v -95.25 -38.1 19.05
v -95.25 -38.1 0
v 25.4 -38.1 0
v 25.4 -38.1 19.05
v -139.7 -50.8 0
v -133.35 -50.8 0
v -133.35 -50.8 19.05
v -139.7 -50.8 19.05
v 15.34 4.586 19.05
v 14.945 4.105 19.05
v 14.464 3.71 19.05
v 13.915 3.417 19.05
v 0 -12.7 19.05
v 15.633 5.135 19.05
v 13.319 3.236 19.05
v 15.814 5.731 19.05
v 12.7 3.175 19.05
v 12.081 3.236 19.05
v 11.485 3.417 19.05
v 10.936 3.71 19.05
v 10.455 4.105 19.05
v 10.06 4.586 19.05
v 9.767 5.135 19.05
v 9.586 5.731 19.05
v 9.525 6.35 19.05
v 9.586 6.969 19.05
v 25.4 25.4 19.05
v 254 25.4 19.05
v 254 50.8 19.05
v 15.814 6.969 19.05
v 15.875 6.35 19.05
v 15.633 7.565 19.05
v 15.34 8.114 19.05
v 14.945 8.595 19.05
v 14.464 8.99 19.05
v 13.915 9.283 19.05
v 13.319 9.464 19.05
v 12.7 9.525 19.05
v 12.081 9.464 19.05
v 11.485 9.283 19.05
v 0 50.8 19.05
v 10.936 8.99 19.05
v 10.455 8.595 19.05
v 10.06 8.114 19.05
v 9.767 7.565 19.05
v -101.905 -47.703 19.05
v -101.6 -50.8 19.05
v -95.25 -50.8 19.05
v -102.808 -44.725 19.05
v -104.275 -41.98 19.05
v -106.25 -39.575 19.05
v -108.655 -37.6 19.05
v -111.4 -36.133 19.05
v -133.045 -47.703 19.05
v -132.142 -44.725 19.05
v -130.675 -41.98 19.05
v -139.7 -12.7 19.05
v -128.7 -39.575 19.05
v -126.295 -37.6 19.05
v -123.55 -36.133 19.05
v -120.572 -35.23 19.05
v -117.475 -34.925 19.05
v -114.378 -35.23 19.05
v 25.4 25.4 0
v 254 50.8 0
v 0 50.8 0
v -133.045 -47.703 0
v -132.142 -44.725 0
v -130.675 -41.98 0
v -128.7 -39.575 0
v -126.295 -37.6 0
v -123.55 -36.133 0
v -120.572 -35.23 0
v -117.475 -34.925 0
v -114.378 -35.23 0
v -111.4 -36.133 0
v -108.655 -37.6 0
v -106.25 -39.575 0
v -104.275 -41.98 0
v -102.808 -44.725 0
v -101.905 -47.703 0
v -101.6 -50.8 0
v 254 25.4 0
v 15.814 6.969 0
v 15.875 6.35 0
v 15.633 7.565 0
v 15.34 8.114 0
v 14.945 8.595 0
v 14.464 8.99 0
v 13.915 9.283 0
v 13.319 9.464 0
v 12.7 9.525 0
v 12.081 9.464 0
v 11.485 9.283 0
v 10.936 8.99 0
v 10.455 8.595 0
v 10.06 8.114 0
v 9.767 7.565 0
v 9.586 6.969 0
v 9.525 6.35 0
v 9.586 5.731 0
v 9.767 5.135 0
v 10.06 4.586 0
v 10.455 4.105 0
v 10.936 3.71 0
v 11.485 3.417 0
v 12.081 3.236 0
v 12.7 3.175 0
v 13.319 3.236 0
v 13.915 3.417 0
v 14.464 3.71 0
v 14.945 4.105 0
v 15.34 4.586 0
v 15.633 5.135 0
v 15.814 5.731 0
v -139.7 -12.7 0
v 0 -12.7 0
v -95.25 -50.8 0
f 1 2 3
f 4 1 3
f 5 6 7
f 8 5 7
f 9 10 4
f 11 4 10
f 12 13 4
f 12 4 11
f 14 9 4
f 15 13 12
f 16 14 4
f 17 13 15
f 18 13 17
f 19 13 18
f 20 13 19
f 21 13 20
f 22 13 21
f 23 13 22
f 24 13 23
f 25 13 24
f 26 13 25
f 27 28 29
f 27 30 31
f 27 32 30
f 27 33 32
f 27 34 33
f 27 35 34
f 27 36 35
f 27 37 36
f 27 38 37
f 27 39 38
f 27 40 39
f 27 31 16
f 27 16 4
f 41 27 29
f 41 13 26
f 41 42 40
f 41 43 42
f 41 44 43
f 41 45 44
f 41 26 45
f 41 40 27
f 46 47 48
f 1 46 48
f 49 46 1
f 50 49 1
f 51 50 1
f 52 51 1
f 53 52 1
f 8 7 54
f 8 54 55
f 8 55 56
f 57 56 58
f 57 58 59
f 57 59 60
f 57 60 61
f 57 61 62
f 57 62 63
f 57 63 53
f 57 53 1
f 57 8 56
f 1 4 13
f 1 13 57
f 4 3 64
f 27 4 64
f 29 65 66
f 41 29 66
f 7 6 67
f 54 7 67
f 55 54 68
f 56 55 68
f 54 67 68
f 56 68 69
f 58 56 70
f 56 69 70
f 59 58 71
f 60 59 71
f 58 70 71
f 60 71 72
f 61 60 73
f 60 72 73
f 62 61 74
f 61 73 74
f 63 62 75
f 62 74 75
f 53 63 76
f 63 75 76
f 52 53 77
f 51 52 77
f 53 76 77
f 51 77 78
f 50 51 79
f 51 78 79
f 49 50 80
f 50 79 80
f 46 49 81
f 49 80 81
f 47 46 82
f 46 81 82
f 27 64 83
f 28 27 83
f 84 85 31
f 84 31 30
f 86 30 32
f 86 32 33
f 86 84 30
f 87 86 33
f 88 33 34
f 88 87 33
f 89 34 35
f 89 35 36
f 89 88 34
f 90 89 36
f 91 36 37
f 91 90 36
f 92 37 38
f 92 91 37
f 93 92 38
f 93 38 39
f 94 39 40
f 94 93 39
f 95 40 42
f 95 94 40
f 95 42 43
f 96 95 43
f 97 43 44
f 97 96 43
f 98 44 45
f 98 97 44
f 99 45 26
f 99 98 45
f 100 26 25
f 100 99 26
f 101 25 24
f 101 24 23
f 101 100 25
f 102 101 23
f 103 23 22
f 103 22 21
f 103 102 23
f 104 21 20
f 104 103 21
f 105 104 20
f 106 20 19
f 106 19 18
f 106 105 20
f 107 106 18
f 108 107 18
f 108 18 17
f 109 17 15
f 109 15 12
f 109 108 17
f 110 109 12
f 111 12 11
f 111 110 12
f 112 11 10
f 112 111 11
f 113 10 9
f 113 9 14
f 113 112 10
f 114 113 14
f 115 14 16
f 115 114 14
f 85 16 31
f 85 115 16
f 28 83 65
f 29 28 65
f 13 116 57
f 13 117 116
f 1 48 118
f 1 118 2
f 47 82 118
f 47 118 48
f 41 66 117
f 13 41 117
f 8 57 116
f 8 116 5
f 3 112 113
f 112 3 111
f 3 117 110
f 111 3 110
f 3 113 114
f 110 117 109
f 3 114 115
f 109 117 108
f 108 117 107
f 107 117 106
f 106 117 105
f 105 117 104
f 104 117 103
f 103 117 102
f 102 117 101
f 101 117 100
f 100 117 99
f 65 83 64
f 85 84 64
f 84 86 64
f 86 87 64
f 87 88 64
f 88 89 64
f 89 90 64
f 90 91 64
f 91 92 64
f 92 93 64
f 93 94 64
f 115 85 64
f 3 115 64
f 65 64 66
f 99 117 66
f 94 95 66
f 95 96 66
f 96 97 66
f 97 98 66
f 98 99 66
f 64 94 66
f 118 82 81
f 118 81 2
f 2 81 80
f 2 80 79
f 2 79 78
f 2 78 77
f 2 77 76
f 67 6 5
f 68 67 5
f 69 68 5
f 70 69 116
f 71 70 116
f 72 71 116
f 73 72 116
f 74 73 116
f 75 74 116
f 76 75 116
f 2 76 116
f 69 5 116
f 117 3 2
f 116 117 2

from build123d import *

# Parameters (mm, degrees)
F0_R     = 3.175
F1_DEPTH = 19.05
F2_W     = 38.1
F2_H     = 19.05
F3_DEPTH = 6.35
F4_W     = 12.7
F4_H     = 19.05
F5_DEPTH = 6.35


with BuildPart() as f1:
    # F0 (on Top) → F1 (new body)
    with BuildSketch(Plane.XY):
        with BuildLine():
            Line((0, 50.8), (0, 0))
            Line((0, 0), (0, -12.7))
            Line((0, -12.7), (-133.35, -12.7))
            Line((-133.35, -12.7), (-133.35, -50.8))
            ThreePointArc((-133.35, -50.8), (-117.475, -34.925), (-101.6, -50.8))
            Line((-101.6, -50.8), (-101.6, -38.1))
            Line((-101.6, -38.1), (25.4, -38.1))
            Line((25.4, -38.1), (25.4, 0))
            Line((25.4, 0), (25.4, 25.4))
            Line((25.4, 25.4), (254, 25.4))
            Line((254, 25.4), (254, 50.8))
            Line((254, 50.8), (0, 50.8))
        make_face()
        with Locations((12.7, 6.35)):
            Circle(F0_R, mode=Mode.SUBTRACT)
    extrude(amount=F1_DEPTH)

    # F2 (on face) → F3 (join)
    with BuildSketch(Plane(origin=(-133.35, 0, 0), x_dir=(0, -1, 0), z_dir=(-1, 0, 0))):
        with Locations((31.75, 9.525)):
            Rectangle(F2_W, F2_H)
    extrude(amount=F3_DEPTH)

    # F4 (on face) → F5 (join)
    with BuildSketch(Plane.YZ.offset(-101.6)):
        with Locations((-44.45, 9.525)):
            Rectangle(F4_W, F4_H)
    extrude(amount=F5_DEPTH)


solid = f1.part
